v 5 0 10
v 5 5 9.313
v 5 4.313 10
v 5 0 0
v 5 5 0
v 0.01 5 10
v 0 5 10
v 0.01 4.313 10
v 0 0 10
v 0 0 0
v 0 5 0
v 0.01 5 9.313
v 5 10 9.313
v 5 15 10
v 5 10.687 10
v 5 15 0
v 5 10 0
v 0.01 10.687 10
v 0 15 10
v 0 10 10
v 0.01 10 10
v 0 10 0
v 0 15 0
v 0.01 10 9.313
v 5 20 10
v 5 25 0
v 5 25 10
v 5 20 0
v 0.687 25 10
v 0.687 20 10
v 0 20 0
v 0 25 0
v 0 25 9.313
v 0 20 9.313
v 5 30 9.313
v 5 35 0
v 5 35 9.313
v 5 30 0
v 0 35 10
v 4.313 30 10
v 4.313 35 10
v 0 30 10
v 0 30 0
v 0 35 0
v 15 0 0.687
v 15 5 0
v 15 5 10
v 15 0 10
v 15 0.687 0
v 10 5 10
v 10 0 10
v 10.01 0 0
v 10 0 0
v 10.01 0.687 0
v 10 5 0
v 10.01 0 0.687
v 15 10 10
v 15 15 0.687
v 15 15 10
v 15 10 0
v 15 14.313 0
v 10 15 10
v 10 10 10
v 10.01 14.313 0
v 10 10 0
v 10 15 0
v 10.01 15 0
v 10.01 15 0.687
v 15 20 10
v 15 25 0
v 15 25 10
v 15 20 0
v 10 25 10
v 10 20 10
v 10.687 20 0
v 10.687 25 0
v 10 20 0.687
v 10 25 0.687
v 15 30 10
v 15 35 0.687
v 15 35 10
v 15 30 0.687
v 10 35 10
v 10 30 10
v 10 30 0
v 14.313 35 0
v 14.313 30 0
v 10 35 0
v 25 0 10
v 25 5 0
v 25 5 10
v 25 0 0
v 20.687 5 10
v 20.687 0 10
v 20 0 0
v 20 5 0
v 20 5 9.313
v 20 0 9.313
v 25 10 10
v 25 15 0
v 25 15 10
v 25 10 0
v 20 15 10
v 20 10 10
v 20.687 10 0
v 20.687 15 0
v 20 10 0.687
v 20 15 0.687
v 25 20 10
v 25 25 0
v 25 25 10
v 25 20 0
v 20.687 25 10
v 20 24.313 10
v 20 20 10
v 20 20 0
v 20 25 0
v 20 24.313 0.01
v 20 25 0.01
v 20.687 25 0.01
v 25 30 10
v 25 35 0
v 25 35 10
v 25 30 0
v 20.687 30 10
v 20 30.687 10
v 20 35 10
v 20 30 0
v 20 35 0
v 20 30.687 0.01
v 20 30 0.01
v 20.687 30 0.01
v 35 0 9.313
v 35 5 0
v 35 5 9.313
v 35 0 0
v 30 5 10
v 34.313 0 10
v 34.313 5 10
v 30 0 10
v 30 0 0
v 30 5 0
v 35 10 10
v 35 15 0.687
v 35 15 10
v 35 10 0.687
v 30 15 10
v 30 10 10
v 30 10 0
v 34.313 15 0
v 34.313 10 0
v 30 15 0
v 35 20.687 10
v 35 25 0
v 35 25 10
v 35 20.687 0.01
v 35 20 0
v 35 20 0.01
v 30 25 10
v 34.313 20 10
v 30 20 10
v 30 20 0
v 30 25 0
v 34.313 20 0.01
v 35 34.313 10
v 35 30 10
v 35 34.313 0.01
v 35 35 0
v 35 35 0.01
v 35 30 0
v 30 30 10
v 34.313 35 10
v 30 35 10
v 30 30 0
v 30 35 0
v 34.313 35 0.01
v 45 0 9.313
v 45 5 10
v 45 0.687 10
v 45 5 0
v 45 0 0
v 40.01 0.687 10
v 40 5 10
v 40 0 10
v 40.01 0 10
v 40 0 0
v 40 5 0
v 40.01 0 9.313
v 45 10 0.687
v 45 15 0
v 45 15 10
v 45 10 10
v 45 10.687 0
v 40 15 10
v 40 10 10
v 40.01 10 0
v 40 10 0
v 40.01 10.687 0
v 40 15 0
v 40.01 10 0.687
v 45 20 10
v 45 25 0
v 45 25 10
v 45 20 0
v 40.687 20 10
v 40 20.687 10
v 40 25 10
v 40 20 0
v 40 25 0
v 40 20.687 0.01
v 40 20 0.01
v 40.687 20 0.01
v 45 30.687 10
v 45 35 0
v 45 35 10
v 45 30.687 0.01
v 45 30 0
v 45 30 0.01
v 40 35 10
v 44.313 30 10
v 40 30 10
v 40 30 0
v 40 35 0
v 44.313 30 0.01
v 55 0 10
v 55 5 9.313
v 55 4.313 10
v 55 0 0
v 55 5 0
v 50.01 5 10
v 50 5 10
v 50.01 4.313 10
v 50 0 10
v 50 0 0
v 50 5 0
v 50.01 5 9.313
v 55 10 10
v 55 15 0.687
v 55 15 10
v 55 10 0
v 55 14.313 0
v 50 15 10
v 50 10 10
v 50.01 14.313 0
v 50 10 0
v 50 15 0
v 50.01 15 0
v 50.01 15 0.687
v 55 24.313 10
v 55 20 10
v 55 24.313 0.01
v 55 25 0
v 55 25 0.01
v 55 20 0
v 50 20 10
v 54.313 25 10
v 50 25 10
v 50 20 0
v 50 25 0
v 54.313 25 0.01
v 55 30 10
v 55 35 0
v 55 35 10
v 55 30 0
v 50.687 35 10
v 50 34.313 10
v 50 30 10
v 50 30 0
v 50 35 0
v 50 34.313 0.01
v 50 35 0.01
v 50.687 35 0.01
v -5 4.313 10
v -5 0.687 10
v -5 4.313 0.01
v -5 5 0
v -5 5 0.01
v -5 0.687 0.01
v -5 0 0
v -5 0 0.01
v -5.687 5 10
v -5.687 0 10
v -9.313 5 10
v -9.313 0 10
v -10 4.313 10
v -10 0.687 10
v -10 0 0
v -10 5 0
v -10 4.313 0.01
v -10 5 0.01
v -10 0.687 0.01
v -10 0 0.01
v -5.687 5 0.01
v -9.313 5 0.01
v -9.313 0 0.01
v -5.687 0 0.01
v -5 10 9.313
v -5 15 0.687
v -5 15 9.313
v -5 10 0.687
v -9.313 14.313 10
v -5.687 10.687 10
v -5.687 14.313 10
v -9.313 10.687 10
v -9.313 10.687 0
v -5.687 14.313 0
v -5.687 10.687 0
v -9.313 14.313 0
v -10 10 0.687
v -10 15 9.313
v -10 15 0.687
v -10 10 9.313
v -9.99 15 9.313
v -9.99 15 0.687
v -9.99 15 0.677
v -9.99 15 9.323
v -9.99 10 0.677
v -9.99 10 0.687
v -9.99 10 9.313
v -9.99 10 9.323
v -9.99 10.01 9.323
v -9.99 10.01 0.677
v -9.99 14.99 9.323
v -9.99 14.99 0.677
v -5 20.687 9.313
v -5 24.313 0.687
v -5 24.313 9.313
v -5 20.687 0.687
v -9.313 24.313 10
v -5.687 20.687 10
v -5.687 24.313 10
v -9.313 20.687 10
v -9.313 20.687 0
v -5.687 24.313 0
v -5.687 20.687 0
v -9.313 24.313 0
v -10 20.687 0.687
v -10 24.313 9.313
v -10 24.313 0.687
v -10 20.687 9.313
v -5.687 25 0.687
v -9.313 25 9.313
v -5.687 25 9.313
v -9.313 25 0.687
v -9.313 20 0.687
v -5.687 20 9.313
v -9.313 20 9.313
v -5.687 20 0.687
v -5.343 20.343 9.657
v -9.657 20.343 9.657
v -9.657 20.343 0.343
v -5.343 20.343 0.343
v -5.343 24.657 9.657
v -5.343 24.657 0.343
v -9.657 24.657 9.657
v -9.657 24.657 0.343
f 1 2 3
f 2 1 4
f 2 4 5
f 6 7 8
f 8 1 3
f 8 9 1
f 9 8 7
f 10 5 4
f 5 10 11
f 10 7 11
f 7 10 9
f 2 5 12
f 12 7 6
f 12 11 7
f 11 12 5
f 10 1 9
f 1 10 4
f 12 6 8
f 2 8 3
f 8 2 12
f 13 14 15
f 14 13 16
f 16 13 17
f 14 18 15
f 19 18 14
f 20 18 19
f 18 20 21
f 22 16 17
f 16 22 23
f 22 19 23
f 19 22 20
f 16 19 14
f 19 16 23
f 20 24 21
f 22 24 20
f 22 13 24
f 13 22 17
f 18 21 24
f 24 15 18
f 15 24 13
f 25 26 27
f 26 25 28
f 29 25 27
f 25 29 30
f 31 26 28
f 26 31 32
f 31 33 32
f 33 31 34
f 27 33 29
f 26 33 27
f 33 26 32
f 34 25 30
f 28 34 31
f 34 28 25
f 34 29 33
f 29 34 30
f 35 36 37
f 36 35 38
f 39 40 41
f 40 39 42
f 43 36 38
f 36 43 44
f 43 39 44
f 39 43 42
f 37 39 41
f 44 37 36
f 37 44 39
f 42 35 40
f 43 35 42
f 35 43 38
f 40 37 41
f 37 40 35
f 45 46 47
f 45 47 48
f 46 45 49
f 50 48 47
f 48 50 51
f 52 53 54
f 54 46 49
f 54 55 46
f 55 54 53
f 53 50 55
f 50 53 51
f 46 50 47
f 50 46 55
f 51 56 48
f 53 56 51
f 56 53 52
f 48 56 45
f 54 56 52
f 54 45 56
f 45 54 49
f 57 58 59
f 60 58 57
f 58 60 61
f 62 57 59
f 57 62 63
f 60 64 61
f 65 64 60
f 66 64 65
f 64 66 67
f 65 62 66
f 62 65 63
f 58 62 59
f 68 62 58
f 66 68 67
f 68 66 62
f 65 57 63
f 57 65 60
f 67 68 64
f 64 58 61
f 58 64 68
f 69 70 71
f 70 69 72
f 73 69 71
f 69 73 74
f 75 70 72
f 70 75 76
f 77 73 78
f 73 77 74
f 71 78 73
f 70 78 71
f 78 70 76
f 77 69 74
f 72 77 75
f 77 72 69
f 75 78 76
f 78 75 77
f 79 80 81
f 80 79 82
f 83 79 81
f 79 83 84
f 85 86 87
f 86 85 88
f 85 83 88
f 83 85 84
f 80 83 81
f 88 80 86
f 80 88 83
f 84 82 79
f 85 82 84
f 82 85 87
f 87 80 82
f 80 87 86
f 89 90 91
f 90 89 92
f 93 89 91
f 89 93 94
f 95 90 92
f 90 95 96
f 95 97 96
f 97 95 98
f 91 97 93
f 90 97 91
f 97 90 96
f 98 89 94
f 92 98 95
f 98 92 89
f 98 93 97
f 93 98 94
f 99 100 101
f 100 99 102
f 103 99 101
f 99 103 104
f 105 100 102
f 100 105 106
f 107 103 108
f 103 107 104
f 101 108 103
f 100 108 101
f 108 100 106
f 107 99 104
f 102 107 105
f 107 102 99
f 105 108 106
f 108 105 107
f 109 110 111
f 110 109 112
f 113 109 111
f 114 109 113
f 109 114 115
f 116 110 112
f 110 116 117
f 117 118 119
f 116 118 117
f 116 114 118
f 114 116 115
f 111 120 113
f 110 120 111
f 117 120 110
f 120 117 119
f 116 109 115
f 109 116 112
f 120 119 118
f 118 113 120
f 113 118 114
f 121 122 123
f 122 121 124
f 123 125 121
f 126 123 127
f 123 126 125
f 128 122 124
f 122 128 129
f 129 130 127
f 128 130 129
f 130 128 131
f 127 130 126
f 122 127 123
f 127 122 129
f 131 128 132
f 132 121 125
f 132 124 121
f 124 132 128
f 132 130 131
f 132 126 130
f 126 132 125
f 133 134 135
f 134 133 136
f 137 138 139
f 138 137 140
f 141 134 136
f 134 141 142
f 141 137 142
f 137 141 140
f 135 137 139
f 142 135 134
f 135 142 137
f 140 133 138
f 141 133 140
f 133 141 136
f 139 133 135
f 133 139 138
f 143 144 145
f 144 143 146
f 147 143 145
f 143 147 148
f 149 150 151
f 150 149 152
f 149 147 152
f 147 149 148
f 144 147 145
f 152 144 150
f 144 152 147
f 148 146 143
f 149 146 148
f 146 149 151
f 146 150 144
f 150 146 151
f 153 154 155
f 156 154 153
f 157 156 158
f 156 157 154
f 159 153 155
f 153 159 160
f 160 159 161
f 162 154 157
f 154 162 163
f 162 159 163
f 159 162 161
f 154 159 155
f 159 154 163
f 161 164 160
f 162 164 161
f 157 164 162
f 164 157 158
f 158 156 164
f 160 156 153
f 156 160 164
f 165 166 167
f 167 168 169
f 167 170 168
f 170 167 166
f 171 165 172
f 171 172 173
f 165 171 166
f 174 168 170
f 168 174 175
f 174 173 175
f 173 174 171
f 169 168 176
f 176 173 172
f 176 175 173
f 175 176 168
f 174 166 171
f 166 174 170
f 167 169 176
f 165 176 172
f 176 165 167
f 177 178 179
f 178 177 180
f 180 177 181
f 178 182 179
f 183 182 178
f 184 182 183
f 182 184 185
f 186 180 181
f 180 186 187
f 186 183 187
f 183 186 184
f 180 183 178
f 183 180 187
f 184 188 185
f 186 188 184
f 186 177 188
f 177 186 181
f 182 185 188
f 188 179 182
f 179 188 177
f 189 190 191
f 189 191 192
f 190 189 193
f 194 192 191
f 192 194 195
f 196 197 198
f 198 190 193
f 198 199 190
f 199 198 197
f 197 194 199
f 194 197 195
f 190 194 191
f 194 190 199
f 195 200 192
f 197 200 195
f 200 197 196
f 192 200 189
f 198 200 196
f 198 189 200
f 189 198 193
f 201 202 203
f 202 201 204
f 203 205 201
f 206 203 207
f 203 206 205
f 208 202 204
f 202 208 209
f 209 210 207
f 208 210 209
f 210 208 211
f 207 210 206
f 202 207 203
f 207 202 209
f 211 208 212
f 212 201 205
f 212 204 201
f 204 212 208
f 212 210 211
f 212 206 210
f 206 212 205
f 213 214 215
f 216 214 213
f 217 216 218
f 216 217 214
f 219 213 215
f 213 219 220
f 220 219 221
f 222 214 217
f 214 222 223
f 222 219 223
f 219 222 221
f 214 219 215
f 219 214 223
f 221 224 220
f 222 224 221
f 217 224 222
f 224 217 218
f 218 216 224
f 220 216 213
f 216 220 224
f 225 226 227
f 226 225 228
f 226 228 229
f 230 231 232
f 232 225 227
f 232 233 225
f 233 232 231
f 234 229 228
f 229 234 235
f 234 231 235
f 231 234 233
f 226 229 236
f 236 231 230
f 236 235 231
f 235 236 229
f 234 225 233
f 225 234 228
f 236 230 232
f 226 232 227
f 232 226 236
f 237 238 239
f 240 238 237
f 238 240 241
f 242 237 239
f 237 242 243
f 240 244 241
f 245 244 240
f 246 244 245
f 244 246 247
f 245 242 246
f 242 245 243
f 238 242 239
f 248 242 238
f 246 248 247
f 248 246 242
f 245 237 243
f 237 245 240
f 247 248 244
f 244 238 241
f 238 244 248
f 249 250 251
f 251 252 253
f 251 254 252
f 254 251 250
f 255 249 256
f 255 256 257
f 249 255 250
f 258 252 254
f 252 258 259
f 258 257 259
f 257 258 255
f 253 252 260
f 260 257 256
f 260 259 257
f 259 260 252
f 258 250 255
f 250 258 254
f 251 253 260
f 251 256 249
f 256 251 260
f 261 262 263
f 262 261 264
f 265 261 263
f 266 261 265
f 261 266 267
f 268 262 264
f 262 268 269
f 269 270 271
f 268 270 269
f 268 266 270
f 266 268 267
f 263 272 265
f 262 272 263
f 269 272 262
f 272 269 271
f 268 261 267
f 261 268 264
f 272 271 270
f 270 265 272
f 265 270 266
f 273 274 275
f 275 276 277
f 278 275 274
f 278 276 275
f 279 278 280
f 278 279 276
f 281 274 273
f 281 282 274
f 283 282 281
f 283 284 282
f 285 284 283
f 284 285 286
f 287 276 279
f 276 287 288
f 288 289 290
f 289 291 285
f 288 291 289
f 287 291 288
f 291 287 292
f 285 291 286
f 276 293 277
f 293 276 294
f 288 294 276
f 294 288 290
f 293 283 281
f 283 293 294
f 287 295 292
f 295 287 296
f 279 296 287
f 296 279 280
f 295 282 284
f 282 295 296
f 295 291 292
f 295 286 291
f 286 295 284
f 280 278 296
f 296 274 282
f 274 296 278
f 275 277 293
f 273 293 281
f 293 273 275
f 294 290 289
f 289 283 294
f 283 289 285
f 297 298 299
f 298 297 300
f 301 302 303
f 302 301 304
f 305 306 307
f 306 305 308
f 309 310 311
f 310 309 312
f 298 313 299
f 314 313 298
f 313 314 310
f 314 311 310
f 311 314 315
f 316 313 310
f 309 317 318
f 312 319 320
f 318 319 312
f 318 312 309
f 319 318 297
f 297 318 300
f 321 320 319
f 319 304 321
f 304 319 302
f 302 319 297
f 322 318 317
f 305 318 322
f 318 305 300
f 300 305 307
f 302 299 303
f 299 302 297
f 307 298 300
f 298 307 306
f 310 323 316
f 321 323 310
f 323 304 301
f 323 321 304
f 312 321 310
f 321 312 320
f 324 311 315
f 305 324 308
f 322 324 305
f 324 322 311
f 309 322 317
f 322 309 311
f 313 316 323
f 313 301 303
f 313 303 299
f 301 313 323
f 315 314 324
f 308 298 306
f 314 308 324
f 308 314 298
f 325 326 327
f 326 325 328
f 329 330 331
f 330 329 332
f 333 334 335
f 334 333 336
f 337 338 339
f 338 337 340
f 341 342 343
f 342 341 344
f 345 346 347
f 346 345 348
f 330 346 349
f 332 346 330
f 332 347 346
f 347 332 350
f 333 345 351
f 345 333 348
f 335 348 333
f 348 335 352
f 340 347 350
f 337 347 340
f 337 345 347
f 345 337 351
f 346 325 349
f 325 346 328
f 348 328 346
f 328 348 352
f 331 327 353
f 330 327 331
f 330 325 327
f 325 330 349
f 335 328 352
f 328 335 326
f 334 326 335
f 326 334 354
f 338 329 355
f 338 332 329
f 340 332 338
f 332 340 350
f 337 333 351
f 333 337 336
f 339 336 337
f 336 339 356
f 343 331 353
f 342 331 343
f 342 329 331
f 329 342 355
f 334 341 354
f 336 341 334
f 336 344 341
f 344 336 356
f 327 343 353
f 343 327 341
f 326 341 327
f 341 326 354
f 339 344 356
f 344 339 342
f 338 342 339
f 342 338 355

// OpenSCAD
union(){difference(){cube(size = [5, 5, 10]);
translate(v = [0.010, 5.010, 10.010])
rotate(a = [0, 90, 0])
rotate(a = [0, 0, -90])
linear_extrude(height = 5.020){polygon(points = [[0, 0], [0.707, 0.000], [0, 0.707], [0, 0]]);
}
}
translate(v = [0, 10])
difference(){cube(size = [5, 5, 10]);
translate(v = [0.010, -0.010, 10.010])
rotate(a = [0, 90, 0])
rotate(a = [0, 0, 0])
linear_extrude(height = 5.020){polygon(points = [[0, 0], [0.707, 0.000], [0, 0.707], [0, 0]]);
}
}
translate(v = [0, 20])
difference(){cube(size = [5, 5, 10]);
translate(v = [-0.010, 5.010, 10.010])
rotate(a = [90, 90, 0])
rotate(a = [0, 0, 0])
linear_extrude(height = 5.020){polygon(points = [[0, 0], [0.707, 0.000], [0, 0.707], [0, 0]]);
}
}
translate(v = [0, 30])
difference(){cube(size = [5, 5, 10]);
translate(v = [5.010, 5.010, 10.010])
rotate(a = [90, 90, 0])
rotate(a = [0, 0, -90])
linear_extrude(height = 5.020){polygon(points = [[0, 0], [0.707, 0.000], [0, 0.707], [0, 0]]);
}
}
translate(v = [10, 0])
difference(){cube(size = [5, 5, 10]);
translate(v = [0.010, -0.010, -0.010])
rotate(a = [0, 90, 0])
rotate(a = [0, 0, 90])
linear_extrude(height = 5.020){polygon(points = [[0, 0], [0.707, 0.000], [0, 0.707], [0, 0]]);
}
}
translate(v = [10, 10])
difference(){cube(size = [5, 5, 10]);
translate(v = [0.010, 5.010, -0.010])
rotate(a = [0, 90, 0])
rotate(a = [0, 0, -180])
linear_extrude(height = 5.020){polygon(points = [[0, 0], [0.707, 0.000], [0, 0.707], [0, 0]]);
}
}
translate(v = [10, 20])
difference(){cube(size = [5, 5, 10]);
translate(v = [-0.010, 5.010, -0.010])
rotate(a = [90, 90, 0])
rotate(a = [0, 0, 90])
linear_extrude(height = 5.020){polygon(points = [[0, 0], [0.707, 0.000], [0, 0.707], [0, 0]]);
}
}
translate(v = [10, 30])
difference(){cube(size = [5, 5, 10]);
translate(v = [5.010, 5.010, -0.010])
rotate(a = [90, 90, 0])
rotate(a = [0, 0, -180])
linear_extrude(height = 5.020){polygon(points = [[0, 0], [0.707, 0.000], [0, 0.707], [0, 0]]);
}
}
translate(v = [20, 0])
difference(){cube(size = [5, 5, 10]);
translate(v = [-0.010, 5.010, 10.010])
rotate(a = [90, 90, 0])
rotate(a = [0, 0, 0])
linear_extrude(height = 5.020){polygon(points = [[0, 0], [0.707, 0.000], [0, 0.707], [0, 0]]);
}
}
translate(v = [20, 10])
difference(){cube(size = [5, 5, 10]);
translate(v = [-0.010, 5.010, -0.010])
rotate(a = [90, 90, 0])
rotate(a = [0, 0, 90])
linear_extrude(height = 5.020){polygon(points = [[0, 0], [0.707, 0.000], [0, 0.707], [0, 0]]);
}
}
translate(v = [20, 20])
difference(){cube(size = [5, 5, 10]);
translate(v = [-0.010, 5.010, 0.010])
rotate(a = [0, 0, 0])
rotate(a = [0, 0, -90])
linear_extrude(height = 10.020){polygon(points = [[0, 0], [0.707, 0.000], [0, 0.707], [0, 0]]);
}
}
translate(v = [20, 30])
difference(){cube(size = [5, 5, 10]);
translate(v = [-0.010, -0.010, 0.010])
rotate(a = [0, 0, 0])
rotate(a = [0, 0, 0])
linear_extrude(height = 10.020){polygon(points = [[0, 0], [0.707, 0.000], [0, 0.707], [0, 0]]);
}
}
translate(v = [30, 0])
difference(){cube(size = [5, 5, 10]);
translate(v = [5.010, 5.010, 10.010])
rotate(a = [90, 90, 0])
rotate(a = [0, 0, -90])
linear_extrude(height = 5.020){polygon(points = [[0, 0], [0.707, 0.000], [0, 0.707], [0, 0]]);
}
}
translate(v = [30, 10])
difference(){cube(size = [5, 5, 10]);
translate(v = [5.010, 5.010, -0.010])
rotate(a = [90, 90, 0])
rotate(a = [0, 0, -180])
linear_extrude(height = 5.020){polygon(points = [[0, 0], [0.707, 0.000], [0, 0.707], [0, 0]]);
}
}
translate(v = [30, 20])
difference(){cube(size = [5, 5, 10]);
translate(v = [5.010, -0.010, 0.010])
rotate(a = [0, 0, 0])
rotate(a = [0, 0, 90])
linear_extrude(height = 10.020){polygon(points = [[0, 0], [0.707, 0.000], [0, 0.707], [0, 0]]);
}
}
translate(v = [30, 30])
difference(){cube(size = [5, 5, 10]);
translate(v = [5.010, 5.010, 0.010])
rotate(a = [0, 0, 0])
rotate(a = [0, 0, -180])
linear_extrude(height = 10.020){polygon(points = [[0, 0], [0.707, 0.000], [0, 0.707], [0, 0]]);
}
}
translate(v = [40, 0])
difference(){cube(size = [5, 5, 10]);
translate(v = [0.010, -0.010, 10.010])
rotate(a = [0, 90, 0])
rotate(a = [0, 0, 0])
linear_extrude(height = 5.020){polygon(points = [[0, 0], [0.707, 0.000], [0, 0.707], [0, 0]]);
}
}
translate(v = [40, 10])
difference(){cube(size = [5, 5, 10]);
translate(v = [0.010, -0.010, -0.010])
rotate(a = [0, 90, 0])
rotate(a = [0, 0, 90])
linear_extrude(height = 5.020){polygon(points = [[0, 0], [0.707, 0.000], [0, 0.707], [0, 0]]);
}
}
translate(v = [40, 20])
difference(){cube(size = [5, 5, 10]);
translate(v = [-0.010, -0.010, 0.010])
rotate(a = [0, 0, 0])
rotate(a = [0, 0, 0])
linear_extrude(height = 10.020){polygon(points = [[0, 0], [0.707, 0.000], [0, 0.707], [0, 0]]);
}
}
translate(v = [40, 30])
difference(){cube(size = [5, 5, 10]);
translate(v = [5.010, -0.010, 0.010])
rotate(a = [0, 0, 0])
rotate(a = [0, 0, 90])
linear_extrude(height = 10.020){polygon(points = [[0, 0], [0.707, 0.000], [0, 0.707], [0, 0]]);
}
}
translate(v = [50, 0])
difference(){cube(size = [5, 5, 10]);
translate(v = [0.010, 5.010, 10.010])
rotate(a = [0, 90, 0])
rotate(a = [0, 0, -90])
linear_extrude(height = 5.020){polygon(points = [[0, 0], [0.707, 0.000], [0, 0.707], [0, 0]]);
}
}
translate(v = [50, 10])
difference(){cube(size = [5, 5, 10]);
translate(v = [0.010, 5.010, -0.010])
rotate(a = [0, 90, 0])
rotate(a = [0, 0, -180])
linear_extrude(height = 5.020){polygon(points = [[0, 0], [0.707, 0.000], [0, 0.707], [0, 0]]);
}
}
translate(v = [50, 20])
difference(){cube(size = [5, 5, 10]);
translate(v = [5.010, 5.010, 0.010])
rotate(a = [0, 0, 0])
rotate(a = [0, 0, -180])
linear_extrude(height = 10.020){polygon(points = [[0, 0], [0.707, 0.000], [0, 0.707], [0, 0]]);
}
}
translate(v = [50, 30])
difference(){cube(size = [5, 5, 10]);
translate(v = [-0.010, 5.010, 0.010])
rotate(a = [0, 0, 0])
rotate(a = [0, 0, -90])
linear_extrude(height = 10.020){polygon(points = [[0, 0], [0.707, 0.000], [0, 0.707], [0, 0]]);
}
}
translate(v = [-10, 0])
difference(){cube(size = [5, 5, 10]);
translate(v = [-0.010, -0.010, 0.010])
rotate(a = [0, 0, 0])
rotate(a = [0, 0, 0])
linear_extrude(height = 10.020){polygon(points = [[0, 0], [0.707, 0.000], [0, 0.707], [0, 0]]);
}
translate(v = [5.010, -0.010, 0.010])
rotate(a = [0, 0, 0])
rotate(a = [0, 0, 90])
linear_extrude(height = 10.020){polygon(points = [[0, 0], [0.707, 0.000], [0, 0.707], [0, 0]]);
}
translate(v = [5.010, 5.010, 0.010])
rotate(a = [0, 0, 0])
rotate(a = [0, 0, -180])
linear_extrude(height = 10.020){polygon(points = [[0, 0], [0.707, 0.000], [0, 0.707], [0, 0]]);
}
translate(v = [-0.010, 5.010, 0.010])
rotate(a = [0, 0, 0])
rotate(a = [0, 0, -90])
linear_extrude(height = 10.020){polygon(points = [[0, 0], [0.707, 0.000], [0, 0.707], [0, 0]]);
}
}
translate(v = [-10, 10])
difference(){cube(size = [5, 5, 10]);
translate(v = [0.010, -0.010, 10.010])
rotate(a = [0, 90, 0])
rotate(a = [0, 0, 0])
linear_extrude(height = 5.020){polygon(points = [[0, 0], [0.707, 0.000], [0, 0.707], [0, 0]]);
}
translate(v = [0.010, -0.010, -0.010])
rotate(a = [0, 90, 0])
rotate(a = [0, 0, 90])
linear_extrude(height = 5.020){polygon(points = [[0, 0], [0.707, 0.000], [0, 0.707], [0, 0]]);
}
translate(v = [5.010, 5.010, 10.010])
rotate(a = [90, 90, 0])
rotate(a = [0, 0, -90])
linear_extrude(height = 5.020){polygon(points = [[0, 0], [0.707, 0.000], [0, 0.707], [0, 0]]);
}
translate(v = [5.010, 5.010, -0.010])
rotate(a = [90, 90, 0])
rotate(a = [0, 0, -180])
linear_extrude(height = 5.020){polygon(points = [[0, 0], [0.707, 0.000], [0, 0.707], [0, 0]]);
}
translate(v = [-0.010, 5.010, 10.010])
rotate(a = [90, 90, 0])
rotate(a = [0, 0, 0])
linear_extrude(height = 5.020){polygon(points = [[0, 0], [0.707, 0.000], [0, 0.707], [0, 0]]);
}
translate(v = [-0.010, 5.010, -0.010])
rotate(a = [90, 90, 0])
rotate(a = [0, 0, 90])
linear_extrude(height = 5.020){polygon(points = [[0, 0], [0.707, 0.000], [0, 0.707], [0, 0]]);
}
translate(v = [0.010, 5.010, 10.010])
rotate(a = [0, 90, 0])
rotate(a = [0, 0, -90])
linear_extrude(height = 5.020){polygon(points = [[0, 0], [0.707, 0.000], [0, 0.707], [0, 0]]);
}
translate(v = [0.010, 5.010, -0.010])
rotate(a = [0, 90, 0])
rotate(a = [0, 0, -180])
linear_extrude(height = 5.020){polygon(points = [[0, 0], [0.707, 0.000], [0, 0.707], [0, 0]]);
}
}
translate(v = [-10, 20])
difference(){cube(size = [5, 5, 10]);
translate(v = [0.010, -0.010, 10.010])
rotate(a = [0, 90, 0])
rotate(a = [0, 0, 0])
linear_extrude(height = 5.020){polygon(points = [[0, 0], [0.707, 0.000], [0, 0.707], [0, 0]]);
}
translate(v = [0.010, -0.010, -0.010])
rotate(a = [0, 90, 0])
rotate(a = [0, 0, 90])
linear_extrude(height = 5.020){polygon(points = [[0, 0], [0.707, 0.000], [0, 0.707], [0, 0]]);
}
translate(v = [-0.010, -0.010, 0.010])
rotate(a = [0, 0, 0])
rotate(a = [0, 0, 0])
linear_extrude(height = 10.020){polygon(points = [[0, 0], [0.707, 0.000], [0, 0.707], [0, 0]]);
}
translate(v = [5.010, -0.010, 0.010])
rotate(a = [0, 0, 0])
rotate(a = [0, 0, 90])
linear_extrude(height = 10.020){polygon(points = [[0, 0], [0.707, 0.000], [0, 0.707], [0, 0]]);
}
translate(v = [5.010, 5.010, 10.010])
rotate(a = [90, 90, 0])
rotate(a = [0, 0, -90])
linear_extrude(height = 5.020){polygon(points = [[0, 0], [0.707, 0.000], [0, 0.707], [0, 0]]);
}
translate(v = [5.010, 5.010, -0.010])
rotate(a = [90, 90, 0])
rotate(a = [0, 0, -180])
linear_extrude(height = 5.020){polygon(points = [[0, 0], [0.707, 0.000], [0, 0.707], [0, 0]]);
}
translate(v = [-0.010, 5.010, 10.010])
rotate(a = [90, 90, 0])
rotate(a = [0, 0, 0])
linear_extrude(height = 5.020){polygon(points = [[0, 0], [0.707, 0.000], [0, 0.707], [0, 0]]);
}
translate(v = [-0.010, 5.010, -0.010])
rotate(a = [90, 90, 0])
rotate(a = [0, 0, 90])
linear_extrude(height = 5.020){polygon(points = [[0, 0], [0.707, 0.000], [0, 0.707], [0, 0]]);
}
translate(v = [0.010, 5.010, 10.010])
rotate(a = [0, 90, 0])
rotate(a = [0, 0, -90])
linear_extrude(height = 5.020){polygon(points = [[0, 0], [0.707, 0.000], [0, 0.707], [0, 0]]);
}
translate(v = [0.010, 5.010, -0.010])
rotate(a = [0, 90, 0])
rotate(a = [0, 0, -180])
linear_extrude(height = 5.020){polygon(points = [[0, 0], [0.707, 0.000], [0, 0.707], [0, 0]]);
}
translate(v = [5.010, 5.010, 0.010])
rotate(a = [0, 0, 0])
rotate(a = [0, 0, -180])
linear_extrude(height = 10.020){polygon(points = [[0, 0], [0.707, 0.000], [0, 0.707], [0, 0]]);
}
translate(v = [-0.010, 5.010, 0.010])
rotate(a = [0, 0, 0])
rotate(a = [0, 0, -90])
linear_extrude(height = 10.020){polygon(points = [[0, 0], [0.707, 0.000], [0, 0.707], [0, 0]]);
}
}
}
